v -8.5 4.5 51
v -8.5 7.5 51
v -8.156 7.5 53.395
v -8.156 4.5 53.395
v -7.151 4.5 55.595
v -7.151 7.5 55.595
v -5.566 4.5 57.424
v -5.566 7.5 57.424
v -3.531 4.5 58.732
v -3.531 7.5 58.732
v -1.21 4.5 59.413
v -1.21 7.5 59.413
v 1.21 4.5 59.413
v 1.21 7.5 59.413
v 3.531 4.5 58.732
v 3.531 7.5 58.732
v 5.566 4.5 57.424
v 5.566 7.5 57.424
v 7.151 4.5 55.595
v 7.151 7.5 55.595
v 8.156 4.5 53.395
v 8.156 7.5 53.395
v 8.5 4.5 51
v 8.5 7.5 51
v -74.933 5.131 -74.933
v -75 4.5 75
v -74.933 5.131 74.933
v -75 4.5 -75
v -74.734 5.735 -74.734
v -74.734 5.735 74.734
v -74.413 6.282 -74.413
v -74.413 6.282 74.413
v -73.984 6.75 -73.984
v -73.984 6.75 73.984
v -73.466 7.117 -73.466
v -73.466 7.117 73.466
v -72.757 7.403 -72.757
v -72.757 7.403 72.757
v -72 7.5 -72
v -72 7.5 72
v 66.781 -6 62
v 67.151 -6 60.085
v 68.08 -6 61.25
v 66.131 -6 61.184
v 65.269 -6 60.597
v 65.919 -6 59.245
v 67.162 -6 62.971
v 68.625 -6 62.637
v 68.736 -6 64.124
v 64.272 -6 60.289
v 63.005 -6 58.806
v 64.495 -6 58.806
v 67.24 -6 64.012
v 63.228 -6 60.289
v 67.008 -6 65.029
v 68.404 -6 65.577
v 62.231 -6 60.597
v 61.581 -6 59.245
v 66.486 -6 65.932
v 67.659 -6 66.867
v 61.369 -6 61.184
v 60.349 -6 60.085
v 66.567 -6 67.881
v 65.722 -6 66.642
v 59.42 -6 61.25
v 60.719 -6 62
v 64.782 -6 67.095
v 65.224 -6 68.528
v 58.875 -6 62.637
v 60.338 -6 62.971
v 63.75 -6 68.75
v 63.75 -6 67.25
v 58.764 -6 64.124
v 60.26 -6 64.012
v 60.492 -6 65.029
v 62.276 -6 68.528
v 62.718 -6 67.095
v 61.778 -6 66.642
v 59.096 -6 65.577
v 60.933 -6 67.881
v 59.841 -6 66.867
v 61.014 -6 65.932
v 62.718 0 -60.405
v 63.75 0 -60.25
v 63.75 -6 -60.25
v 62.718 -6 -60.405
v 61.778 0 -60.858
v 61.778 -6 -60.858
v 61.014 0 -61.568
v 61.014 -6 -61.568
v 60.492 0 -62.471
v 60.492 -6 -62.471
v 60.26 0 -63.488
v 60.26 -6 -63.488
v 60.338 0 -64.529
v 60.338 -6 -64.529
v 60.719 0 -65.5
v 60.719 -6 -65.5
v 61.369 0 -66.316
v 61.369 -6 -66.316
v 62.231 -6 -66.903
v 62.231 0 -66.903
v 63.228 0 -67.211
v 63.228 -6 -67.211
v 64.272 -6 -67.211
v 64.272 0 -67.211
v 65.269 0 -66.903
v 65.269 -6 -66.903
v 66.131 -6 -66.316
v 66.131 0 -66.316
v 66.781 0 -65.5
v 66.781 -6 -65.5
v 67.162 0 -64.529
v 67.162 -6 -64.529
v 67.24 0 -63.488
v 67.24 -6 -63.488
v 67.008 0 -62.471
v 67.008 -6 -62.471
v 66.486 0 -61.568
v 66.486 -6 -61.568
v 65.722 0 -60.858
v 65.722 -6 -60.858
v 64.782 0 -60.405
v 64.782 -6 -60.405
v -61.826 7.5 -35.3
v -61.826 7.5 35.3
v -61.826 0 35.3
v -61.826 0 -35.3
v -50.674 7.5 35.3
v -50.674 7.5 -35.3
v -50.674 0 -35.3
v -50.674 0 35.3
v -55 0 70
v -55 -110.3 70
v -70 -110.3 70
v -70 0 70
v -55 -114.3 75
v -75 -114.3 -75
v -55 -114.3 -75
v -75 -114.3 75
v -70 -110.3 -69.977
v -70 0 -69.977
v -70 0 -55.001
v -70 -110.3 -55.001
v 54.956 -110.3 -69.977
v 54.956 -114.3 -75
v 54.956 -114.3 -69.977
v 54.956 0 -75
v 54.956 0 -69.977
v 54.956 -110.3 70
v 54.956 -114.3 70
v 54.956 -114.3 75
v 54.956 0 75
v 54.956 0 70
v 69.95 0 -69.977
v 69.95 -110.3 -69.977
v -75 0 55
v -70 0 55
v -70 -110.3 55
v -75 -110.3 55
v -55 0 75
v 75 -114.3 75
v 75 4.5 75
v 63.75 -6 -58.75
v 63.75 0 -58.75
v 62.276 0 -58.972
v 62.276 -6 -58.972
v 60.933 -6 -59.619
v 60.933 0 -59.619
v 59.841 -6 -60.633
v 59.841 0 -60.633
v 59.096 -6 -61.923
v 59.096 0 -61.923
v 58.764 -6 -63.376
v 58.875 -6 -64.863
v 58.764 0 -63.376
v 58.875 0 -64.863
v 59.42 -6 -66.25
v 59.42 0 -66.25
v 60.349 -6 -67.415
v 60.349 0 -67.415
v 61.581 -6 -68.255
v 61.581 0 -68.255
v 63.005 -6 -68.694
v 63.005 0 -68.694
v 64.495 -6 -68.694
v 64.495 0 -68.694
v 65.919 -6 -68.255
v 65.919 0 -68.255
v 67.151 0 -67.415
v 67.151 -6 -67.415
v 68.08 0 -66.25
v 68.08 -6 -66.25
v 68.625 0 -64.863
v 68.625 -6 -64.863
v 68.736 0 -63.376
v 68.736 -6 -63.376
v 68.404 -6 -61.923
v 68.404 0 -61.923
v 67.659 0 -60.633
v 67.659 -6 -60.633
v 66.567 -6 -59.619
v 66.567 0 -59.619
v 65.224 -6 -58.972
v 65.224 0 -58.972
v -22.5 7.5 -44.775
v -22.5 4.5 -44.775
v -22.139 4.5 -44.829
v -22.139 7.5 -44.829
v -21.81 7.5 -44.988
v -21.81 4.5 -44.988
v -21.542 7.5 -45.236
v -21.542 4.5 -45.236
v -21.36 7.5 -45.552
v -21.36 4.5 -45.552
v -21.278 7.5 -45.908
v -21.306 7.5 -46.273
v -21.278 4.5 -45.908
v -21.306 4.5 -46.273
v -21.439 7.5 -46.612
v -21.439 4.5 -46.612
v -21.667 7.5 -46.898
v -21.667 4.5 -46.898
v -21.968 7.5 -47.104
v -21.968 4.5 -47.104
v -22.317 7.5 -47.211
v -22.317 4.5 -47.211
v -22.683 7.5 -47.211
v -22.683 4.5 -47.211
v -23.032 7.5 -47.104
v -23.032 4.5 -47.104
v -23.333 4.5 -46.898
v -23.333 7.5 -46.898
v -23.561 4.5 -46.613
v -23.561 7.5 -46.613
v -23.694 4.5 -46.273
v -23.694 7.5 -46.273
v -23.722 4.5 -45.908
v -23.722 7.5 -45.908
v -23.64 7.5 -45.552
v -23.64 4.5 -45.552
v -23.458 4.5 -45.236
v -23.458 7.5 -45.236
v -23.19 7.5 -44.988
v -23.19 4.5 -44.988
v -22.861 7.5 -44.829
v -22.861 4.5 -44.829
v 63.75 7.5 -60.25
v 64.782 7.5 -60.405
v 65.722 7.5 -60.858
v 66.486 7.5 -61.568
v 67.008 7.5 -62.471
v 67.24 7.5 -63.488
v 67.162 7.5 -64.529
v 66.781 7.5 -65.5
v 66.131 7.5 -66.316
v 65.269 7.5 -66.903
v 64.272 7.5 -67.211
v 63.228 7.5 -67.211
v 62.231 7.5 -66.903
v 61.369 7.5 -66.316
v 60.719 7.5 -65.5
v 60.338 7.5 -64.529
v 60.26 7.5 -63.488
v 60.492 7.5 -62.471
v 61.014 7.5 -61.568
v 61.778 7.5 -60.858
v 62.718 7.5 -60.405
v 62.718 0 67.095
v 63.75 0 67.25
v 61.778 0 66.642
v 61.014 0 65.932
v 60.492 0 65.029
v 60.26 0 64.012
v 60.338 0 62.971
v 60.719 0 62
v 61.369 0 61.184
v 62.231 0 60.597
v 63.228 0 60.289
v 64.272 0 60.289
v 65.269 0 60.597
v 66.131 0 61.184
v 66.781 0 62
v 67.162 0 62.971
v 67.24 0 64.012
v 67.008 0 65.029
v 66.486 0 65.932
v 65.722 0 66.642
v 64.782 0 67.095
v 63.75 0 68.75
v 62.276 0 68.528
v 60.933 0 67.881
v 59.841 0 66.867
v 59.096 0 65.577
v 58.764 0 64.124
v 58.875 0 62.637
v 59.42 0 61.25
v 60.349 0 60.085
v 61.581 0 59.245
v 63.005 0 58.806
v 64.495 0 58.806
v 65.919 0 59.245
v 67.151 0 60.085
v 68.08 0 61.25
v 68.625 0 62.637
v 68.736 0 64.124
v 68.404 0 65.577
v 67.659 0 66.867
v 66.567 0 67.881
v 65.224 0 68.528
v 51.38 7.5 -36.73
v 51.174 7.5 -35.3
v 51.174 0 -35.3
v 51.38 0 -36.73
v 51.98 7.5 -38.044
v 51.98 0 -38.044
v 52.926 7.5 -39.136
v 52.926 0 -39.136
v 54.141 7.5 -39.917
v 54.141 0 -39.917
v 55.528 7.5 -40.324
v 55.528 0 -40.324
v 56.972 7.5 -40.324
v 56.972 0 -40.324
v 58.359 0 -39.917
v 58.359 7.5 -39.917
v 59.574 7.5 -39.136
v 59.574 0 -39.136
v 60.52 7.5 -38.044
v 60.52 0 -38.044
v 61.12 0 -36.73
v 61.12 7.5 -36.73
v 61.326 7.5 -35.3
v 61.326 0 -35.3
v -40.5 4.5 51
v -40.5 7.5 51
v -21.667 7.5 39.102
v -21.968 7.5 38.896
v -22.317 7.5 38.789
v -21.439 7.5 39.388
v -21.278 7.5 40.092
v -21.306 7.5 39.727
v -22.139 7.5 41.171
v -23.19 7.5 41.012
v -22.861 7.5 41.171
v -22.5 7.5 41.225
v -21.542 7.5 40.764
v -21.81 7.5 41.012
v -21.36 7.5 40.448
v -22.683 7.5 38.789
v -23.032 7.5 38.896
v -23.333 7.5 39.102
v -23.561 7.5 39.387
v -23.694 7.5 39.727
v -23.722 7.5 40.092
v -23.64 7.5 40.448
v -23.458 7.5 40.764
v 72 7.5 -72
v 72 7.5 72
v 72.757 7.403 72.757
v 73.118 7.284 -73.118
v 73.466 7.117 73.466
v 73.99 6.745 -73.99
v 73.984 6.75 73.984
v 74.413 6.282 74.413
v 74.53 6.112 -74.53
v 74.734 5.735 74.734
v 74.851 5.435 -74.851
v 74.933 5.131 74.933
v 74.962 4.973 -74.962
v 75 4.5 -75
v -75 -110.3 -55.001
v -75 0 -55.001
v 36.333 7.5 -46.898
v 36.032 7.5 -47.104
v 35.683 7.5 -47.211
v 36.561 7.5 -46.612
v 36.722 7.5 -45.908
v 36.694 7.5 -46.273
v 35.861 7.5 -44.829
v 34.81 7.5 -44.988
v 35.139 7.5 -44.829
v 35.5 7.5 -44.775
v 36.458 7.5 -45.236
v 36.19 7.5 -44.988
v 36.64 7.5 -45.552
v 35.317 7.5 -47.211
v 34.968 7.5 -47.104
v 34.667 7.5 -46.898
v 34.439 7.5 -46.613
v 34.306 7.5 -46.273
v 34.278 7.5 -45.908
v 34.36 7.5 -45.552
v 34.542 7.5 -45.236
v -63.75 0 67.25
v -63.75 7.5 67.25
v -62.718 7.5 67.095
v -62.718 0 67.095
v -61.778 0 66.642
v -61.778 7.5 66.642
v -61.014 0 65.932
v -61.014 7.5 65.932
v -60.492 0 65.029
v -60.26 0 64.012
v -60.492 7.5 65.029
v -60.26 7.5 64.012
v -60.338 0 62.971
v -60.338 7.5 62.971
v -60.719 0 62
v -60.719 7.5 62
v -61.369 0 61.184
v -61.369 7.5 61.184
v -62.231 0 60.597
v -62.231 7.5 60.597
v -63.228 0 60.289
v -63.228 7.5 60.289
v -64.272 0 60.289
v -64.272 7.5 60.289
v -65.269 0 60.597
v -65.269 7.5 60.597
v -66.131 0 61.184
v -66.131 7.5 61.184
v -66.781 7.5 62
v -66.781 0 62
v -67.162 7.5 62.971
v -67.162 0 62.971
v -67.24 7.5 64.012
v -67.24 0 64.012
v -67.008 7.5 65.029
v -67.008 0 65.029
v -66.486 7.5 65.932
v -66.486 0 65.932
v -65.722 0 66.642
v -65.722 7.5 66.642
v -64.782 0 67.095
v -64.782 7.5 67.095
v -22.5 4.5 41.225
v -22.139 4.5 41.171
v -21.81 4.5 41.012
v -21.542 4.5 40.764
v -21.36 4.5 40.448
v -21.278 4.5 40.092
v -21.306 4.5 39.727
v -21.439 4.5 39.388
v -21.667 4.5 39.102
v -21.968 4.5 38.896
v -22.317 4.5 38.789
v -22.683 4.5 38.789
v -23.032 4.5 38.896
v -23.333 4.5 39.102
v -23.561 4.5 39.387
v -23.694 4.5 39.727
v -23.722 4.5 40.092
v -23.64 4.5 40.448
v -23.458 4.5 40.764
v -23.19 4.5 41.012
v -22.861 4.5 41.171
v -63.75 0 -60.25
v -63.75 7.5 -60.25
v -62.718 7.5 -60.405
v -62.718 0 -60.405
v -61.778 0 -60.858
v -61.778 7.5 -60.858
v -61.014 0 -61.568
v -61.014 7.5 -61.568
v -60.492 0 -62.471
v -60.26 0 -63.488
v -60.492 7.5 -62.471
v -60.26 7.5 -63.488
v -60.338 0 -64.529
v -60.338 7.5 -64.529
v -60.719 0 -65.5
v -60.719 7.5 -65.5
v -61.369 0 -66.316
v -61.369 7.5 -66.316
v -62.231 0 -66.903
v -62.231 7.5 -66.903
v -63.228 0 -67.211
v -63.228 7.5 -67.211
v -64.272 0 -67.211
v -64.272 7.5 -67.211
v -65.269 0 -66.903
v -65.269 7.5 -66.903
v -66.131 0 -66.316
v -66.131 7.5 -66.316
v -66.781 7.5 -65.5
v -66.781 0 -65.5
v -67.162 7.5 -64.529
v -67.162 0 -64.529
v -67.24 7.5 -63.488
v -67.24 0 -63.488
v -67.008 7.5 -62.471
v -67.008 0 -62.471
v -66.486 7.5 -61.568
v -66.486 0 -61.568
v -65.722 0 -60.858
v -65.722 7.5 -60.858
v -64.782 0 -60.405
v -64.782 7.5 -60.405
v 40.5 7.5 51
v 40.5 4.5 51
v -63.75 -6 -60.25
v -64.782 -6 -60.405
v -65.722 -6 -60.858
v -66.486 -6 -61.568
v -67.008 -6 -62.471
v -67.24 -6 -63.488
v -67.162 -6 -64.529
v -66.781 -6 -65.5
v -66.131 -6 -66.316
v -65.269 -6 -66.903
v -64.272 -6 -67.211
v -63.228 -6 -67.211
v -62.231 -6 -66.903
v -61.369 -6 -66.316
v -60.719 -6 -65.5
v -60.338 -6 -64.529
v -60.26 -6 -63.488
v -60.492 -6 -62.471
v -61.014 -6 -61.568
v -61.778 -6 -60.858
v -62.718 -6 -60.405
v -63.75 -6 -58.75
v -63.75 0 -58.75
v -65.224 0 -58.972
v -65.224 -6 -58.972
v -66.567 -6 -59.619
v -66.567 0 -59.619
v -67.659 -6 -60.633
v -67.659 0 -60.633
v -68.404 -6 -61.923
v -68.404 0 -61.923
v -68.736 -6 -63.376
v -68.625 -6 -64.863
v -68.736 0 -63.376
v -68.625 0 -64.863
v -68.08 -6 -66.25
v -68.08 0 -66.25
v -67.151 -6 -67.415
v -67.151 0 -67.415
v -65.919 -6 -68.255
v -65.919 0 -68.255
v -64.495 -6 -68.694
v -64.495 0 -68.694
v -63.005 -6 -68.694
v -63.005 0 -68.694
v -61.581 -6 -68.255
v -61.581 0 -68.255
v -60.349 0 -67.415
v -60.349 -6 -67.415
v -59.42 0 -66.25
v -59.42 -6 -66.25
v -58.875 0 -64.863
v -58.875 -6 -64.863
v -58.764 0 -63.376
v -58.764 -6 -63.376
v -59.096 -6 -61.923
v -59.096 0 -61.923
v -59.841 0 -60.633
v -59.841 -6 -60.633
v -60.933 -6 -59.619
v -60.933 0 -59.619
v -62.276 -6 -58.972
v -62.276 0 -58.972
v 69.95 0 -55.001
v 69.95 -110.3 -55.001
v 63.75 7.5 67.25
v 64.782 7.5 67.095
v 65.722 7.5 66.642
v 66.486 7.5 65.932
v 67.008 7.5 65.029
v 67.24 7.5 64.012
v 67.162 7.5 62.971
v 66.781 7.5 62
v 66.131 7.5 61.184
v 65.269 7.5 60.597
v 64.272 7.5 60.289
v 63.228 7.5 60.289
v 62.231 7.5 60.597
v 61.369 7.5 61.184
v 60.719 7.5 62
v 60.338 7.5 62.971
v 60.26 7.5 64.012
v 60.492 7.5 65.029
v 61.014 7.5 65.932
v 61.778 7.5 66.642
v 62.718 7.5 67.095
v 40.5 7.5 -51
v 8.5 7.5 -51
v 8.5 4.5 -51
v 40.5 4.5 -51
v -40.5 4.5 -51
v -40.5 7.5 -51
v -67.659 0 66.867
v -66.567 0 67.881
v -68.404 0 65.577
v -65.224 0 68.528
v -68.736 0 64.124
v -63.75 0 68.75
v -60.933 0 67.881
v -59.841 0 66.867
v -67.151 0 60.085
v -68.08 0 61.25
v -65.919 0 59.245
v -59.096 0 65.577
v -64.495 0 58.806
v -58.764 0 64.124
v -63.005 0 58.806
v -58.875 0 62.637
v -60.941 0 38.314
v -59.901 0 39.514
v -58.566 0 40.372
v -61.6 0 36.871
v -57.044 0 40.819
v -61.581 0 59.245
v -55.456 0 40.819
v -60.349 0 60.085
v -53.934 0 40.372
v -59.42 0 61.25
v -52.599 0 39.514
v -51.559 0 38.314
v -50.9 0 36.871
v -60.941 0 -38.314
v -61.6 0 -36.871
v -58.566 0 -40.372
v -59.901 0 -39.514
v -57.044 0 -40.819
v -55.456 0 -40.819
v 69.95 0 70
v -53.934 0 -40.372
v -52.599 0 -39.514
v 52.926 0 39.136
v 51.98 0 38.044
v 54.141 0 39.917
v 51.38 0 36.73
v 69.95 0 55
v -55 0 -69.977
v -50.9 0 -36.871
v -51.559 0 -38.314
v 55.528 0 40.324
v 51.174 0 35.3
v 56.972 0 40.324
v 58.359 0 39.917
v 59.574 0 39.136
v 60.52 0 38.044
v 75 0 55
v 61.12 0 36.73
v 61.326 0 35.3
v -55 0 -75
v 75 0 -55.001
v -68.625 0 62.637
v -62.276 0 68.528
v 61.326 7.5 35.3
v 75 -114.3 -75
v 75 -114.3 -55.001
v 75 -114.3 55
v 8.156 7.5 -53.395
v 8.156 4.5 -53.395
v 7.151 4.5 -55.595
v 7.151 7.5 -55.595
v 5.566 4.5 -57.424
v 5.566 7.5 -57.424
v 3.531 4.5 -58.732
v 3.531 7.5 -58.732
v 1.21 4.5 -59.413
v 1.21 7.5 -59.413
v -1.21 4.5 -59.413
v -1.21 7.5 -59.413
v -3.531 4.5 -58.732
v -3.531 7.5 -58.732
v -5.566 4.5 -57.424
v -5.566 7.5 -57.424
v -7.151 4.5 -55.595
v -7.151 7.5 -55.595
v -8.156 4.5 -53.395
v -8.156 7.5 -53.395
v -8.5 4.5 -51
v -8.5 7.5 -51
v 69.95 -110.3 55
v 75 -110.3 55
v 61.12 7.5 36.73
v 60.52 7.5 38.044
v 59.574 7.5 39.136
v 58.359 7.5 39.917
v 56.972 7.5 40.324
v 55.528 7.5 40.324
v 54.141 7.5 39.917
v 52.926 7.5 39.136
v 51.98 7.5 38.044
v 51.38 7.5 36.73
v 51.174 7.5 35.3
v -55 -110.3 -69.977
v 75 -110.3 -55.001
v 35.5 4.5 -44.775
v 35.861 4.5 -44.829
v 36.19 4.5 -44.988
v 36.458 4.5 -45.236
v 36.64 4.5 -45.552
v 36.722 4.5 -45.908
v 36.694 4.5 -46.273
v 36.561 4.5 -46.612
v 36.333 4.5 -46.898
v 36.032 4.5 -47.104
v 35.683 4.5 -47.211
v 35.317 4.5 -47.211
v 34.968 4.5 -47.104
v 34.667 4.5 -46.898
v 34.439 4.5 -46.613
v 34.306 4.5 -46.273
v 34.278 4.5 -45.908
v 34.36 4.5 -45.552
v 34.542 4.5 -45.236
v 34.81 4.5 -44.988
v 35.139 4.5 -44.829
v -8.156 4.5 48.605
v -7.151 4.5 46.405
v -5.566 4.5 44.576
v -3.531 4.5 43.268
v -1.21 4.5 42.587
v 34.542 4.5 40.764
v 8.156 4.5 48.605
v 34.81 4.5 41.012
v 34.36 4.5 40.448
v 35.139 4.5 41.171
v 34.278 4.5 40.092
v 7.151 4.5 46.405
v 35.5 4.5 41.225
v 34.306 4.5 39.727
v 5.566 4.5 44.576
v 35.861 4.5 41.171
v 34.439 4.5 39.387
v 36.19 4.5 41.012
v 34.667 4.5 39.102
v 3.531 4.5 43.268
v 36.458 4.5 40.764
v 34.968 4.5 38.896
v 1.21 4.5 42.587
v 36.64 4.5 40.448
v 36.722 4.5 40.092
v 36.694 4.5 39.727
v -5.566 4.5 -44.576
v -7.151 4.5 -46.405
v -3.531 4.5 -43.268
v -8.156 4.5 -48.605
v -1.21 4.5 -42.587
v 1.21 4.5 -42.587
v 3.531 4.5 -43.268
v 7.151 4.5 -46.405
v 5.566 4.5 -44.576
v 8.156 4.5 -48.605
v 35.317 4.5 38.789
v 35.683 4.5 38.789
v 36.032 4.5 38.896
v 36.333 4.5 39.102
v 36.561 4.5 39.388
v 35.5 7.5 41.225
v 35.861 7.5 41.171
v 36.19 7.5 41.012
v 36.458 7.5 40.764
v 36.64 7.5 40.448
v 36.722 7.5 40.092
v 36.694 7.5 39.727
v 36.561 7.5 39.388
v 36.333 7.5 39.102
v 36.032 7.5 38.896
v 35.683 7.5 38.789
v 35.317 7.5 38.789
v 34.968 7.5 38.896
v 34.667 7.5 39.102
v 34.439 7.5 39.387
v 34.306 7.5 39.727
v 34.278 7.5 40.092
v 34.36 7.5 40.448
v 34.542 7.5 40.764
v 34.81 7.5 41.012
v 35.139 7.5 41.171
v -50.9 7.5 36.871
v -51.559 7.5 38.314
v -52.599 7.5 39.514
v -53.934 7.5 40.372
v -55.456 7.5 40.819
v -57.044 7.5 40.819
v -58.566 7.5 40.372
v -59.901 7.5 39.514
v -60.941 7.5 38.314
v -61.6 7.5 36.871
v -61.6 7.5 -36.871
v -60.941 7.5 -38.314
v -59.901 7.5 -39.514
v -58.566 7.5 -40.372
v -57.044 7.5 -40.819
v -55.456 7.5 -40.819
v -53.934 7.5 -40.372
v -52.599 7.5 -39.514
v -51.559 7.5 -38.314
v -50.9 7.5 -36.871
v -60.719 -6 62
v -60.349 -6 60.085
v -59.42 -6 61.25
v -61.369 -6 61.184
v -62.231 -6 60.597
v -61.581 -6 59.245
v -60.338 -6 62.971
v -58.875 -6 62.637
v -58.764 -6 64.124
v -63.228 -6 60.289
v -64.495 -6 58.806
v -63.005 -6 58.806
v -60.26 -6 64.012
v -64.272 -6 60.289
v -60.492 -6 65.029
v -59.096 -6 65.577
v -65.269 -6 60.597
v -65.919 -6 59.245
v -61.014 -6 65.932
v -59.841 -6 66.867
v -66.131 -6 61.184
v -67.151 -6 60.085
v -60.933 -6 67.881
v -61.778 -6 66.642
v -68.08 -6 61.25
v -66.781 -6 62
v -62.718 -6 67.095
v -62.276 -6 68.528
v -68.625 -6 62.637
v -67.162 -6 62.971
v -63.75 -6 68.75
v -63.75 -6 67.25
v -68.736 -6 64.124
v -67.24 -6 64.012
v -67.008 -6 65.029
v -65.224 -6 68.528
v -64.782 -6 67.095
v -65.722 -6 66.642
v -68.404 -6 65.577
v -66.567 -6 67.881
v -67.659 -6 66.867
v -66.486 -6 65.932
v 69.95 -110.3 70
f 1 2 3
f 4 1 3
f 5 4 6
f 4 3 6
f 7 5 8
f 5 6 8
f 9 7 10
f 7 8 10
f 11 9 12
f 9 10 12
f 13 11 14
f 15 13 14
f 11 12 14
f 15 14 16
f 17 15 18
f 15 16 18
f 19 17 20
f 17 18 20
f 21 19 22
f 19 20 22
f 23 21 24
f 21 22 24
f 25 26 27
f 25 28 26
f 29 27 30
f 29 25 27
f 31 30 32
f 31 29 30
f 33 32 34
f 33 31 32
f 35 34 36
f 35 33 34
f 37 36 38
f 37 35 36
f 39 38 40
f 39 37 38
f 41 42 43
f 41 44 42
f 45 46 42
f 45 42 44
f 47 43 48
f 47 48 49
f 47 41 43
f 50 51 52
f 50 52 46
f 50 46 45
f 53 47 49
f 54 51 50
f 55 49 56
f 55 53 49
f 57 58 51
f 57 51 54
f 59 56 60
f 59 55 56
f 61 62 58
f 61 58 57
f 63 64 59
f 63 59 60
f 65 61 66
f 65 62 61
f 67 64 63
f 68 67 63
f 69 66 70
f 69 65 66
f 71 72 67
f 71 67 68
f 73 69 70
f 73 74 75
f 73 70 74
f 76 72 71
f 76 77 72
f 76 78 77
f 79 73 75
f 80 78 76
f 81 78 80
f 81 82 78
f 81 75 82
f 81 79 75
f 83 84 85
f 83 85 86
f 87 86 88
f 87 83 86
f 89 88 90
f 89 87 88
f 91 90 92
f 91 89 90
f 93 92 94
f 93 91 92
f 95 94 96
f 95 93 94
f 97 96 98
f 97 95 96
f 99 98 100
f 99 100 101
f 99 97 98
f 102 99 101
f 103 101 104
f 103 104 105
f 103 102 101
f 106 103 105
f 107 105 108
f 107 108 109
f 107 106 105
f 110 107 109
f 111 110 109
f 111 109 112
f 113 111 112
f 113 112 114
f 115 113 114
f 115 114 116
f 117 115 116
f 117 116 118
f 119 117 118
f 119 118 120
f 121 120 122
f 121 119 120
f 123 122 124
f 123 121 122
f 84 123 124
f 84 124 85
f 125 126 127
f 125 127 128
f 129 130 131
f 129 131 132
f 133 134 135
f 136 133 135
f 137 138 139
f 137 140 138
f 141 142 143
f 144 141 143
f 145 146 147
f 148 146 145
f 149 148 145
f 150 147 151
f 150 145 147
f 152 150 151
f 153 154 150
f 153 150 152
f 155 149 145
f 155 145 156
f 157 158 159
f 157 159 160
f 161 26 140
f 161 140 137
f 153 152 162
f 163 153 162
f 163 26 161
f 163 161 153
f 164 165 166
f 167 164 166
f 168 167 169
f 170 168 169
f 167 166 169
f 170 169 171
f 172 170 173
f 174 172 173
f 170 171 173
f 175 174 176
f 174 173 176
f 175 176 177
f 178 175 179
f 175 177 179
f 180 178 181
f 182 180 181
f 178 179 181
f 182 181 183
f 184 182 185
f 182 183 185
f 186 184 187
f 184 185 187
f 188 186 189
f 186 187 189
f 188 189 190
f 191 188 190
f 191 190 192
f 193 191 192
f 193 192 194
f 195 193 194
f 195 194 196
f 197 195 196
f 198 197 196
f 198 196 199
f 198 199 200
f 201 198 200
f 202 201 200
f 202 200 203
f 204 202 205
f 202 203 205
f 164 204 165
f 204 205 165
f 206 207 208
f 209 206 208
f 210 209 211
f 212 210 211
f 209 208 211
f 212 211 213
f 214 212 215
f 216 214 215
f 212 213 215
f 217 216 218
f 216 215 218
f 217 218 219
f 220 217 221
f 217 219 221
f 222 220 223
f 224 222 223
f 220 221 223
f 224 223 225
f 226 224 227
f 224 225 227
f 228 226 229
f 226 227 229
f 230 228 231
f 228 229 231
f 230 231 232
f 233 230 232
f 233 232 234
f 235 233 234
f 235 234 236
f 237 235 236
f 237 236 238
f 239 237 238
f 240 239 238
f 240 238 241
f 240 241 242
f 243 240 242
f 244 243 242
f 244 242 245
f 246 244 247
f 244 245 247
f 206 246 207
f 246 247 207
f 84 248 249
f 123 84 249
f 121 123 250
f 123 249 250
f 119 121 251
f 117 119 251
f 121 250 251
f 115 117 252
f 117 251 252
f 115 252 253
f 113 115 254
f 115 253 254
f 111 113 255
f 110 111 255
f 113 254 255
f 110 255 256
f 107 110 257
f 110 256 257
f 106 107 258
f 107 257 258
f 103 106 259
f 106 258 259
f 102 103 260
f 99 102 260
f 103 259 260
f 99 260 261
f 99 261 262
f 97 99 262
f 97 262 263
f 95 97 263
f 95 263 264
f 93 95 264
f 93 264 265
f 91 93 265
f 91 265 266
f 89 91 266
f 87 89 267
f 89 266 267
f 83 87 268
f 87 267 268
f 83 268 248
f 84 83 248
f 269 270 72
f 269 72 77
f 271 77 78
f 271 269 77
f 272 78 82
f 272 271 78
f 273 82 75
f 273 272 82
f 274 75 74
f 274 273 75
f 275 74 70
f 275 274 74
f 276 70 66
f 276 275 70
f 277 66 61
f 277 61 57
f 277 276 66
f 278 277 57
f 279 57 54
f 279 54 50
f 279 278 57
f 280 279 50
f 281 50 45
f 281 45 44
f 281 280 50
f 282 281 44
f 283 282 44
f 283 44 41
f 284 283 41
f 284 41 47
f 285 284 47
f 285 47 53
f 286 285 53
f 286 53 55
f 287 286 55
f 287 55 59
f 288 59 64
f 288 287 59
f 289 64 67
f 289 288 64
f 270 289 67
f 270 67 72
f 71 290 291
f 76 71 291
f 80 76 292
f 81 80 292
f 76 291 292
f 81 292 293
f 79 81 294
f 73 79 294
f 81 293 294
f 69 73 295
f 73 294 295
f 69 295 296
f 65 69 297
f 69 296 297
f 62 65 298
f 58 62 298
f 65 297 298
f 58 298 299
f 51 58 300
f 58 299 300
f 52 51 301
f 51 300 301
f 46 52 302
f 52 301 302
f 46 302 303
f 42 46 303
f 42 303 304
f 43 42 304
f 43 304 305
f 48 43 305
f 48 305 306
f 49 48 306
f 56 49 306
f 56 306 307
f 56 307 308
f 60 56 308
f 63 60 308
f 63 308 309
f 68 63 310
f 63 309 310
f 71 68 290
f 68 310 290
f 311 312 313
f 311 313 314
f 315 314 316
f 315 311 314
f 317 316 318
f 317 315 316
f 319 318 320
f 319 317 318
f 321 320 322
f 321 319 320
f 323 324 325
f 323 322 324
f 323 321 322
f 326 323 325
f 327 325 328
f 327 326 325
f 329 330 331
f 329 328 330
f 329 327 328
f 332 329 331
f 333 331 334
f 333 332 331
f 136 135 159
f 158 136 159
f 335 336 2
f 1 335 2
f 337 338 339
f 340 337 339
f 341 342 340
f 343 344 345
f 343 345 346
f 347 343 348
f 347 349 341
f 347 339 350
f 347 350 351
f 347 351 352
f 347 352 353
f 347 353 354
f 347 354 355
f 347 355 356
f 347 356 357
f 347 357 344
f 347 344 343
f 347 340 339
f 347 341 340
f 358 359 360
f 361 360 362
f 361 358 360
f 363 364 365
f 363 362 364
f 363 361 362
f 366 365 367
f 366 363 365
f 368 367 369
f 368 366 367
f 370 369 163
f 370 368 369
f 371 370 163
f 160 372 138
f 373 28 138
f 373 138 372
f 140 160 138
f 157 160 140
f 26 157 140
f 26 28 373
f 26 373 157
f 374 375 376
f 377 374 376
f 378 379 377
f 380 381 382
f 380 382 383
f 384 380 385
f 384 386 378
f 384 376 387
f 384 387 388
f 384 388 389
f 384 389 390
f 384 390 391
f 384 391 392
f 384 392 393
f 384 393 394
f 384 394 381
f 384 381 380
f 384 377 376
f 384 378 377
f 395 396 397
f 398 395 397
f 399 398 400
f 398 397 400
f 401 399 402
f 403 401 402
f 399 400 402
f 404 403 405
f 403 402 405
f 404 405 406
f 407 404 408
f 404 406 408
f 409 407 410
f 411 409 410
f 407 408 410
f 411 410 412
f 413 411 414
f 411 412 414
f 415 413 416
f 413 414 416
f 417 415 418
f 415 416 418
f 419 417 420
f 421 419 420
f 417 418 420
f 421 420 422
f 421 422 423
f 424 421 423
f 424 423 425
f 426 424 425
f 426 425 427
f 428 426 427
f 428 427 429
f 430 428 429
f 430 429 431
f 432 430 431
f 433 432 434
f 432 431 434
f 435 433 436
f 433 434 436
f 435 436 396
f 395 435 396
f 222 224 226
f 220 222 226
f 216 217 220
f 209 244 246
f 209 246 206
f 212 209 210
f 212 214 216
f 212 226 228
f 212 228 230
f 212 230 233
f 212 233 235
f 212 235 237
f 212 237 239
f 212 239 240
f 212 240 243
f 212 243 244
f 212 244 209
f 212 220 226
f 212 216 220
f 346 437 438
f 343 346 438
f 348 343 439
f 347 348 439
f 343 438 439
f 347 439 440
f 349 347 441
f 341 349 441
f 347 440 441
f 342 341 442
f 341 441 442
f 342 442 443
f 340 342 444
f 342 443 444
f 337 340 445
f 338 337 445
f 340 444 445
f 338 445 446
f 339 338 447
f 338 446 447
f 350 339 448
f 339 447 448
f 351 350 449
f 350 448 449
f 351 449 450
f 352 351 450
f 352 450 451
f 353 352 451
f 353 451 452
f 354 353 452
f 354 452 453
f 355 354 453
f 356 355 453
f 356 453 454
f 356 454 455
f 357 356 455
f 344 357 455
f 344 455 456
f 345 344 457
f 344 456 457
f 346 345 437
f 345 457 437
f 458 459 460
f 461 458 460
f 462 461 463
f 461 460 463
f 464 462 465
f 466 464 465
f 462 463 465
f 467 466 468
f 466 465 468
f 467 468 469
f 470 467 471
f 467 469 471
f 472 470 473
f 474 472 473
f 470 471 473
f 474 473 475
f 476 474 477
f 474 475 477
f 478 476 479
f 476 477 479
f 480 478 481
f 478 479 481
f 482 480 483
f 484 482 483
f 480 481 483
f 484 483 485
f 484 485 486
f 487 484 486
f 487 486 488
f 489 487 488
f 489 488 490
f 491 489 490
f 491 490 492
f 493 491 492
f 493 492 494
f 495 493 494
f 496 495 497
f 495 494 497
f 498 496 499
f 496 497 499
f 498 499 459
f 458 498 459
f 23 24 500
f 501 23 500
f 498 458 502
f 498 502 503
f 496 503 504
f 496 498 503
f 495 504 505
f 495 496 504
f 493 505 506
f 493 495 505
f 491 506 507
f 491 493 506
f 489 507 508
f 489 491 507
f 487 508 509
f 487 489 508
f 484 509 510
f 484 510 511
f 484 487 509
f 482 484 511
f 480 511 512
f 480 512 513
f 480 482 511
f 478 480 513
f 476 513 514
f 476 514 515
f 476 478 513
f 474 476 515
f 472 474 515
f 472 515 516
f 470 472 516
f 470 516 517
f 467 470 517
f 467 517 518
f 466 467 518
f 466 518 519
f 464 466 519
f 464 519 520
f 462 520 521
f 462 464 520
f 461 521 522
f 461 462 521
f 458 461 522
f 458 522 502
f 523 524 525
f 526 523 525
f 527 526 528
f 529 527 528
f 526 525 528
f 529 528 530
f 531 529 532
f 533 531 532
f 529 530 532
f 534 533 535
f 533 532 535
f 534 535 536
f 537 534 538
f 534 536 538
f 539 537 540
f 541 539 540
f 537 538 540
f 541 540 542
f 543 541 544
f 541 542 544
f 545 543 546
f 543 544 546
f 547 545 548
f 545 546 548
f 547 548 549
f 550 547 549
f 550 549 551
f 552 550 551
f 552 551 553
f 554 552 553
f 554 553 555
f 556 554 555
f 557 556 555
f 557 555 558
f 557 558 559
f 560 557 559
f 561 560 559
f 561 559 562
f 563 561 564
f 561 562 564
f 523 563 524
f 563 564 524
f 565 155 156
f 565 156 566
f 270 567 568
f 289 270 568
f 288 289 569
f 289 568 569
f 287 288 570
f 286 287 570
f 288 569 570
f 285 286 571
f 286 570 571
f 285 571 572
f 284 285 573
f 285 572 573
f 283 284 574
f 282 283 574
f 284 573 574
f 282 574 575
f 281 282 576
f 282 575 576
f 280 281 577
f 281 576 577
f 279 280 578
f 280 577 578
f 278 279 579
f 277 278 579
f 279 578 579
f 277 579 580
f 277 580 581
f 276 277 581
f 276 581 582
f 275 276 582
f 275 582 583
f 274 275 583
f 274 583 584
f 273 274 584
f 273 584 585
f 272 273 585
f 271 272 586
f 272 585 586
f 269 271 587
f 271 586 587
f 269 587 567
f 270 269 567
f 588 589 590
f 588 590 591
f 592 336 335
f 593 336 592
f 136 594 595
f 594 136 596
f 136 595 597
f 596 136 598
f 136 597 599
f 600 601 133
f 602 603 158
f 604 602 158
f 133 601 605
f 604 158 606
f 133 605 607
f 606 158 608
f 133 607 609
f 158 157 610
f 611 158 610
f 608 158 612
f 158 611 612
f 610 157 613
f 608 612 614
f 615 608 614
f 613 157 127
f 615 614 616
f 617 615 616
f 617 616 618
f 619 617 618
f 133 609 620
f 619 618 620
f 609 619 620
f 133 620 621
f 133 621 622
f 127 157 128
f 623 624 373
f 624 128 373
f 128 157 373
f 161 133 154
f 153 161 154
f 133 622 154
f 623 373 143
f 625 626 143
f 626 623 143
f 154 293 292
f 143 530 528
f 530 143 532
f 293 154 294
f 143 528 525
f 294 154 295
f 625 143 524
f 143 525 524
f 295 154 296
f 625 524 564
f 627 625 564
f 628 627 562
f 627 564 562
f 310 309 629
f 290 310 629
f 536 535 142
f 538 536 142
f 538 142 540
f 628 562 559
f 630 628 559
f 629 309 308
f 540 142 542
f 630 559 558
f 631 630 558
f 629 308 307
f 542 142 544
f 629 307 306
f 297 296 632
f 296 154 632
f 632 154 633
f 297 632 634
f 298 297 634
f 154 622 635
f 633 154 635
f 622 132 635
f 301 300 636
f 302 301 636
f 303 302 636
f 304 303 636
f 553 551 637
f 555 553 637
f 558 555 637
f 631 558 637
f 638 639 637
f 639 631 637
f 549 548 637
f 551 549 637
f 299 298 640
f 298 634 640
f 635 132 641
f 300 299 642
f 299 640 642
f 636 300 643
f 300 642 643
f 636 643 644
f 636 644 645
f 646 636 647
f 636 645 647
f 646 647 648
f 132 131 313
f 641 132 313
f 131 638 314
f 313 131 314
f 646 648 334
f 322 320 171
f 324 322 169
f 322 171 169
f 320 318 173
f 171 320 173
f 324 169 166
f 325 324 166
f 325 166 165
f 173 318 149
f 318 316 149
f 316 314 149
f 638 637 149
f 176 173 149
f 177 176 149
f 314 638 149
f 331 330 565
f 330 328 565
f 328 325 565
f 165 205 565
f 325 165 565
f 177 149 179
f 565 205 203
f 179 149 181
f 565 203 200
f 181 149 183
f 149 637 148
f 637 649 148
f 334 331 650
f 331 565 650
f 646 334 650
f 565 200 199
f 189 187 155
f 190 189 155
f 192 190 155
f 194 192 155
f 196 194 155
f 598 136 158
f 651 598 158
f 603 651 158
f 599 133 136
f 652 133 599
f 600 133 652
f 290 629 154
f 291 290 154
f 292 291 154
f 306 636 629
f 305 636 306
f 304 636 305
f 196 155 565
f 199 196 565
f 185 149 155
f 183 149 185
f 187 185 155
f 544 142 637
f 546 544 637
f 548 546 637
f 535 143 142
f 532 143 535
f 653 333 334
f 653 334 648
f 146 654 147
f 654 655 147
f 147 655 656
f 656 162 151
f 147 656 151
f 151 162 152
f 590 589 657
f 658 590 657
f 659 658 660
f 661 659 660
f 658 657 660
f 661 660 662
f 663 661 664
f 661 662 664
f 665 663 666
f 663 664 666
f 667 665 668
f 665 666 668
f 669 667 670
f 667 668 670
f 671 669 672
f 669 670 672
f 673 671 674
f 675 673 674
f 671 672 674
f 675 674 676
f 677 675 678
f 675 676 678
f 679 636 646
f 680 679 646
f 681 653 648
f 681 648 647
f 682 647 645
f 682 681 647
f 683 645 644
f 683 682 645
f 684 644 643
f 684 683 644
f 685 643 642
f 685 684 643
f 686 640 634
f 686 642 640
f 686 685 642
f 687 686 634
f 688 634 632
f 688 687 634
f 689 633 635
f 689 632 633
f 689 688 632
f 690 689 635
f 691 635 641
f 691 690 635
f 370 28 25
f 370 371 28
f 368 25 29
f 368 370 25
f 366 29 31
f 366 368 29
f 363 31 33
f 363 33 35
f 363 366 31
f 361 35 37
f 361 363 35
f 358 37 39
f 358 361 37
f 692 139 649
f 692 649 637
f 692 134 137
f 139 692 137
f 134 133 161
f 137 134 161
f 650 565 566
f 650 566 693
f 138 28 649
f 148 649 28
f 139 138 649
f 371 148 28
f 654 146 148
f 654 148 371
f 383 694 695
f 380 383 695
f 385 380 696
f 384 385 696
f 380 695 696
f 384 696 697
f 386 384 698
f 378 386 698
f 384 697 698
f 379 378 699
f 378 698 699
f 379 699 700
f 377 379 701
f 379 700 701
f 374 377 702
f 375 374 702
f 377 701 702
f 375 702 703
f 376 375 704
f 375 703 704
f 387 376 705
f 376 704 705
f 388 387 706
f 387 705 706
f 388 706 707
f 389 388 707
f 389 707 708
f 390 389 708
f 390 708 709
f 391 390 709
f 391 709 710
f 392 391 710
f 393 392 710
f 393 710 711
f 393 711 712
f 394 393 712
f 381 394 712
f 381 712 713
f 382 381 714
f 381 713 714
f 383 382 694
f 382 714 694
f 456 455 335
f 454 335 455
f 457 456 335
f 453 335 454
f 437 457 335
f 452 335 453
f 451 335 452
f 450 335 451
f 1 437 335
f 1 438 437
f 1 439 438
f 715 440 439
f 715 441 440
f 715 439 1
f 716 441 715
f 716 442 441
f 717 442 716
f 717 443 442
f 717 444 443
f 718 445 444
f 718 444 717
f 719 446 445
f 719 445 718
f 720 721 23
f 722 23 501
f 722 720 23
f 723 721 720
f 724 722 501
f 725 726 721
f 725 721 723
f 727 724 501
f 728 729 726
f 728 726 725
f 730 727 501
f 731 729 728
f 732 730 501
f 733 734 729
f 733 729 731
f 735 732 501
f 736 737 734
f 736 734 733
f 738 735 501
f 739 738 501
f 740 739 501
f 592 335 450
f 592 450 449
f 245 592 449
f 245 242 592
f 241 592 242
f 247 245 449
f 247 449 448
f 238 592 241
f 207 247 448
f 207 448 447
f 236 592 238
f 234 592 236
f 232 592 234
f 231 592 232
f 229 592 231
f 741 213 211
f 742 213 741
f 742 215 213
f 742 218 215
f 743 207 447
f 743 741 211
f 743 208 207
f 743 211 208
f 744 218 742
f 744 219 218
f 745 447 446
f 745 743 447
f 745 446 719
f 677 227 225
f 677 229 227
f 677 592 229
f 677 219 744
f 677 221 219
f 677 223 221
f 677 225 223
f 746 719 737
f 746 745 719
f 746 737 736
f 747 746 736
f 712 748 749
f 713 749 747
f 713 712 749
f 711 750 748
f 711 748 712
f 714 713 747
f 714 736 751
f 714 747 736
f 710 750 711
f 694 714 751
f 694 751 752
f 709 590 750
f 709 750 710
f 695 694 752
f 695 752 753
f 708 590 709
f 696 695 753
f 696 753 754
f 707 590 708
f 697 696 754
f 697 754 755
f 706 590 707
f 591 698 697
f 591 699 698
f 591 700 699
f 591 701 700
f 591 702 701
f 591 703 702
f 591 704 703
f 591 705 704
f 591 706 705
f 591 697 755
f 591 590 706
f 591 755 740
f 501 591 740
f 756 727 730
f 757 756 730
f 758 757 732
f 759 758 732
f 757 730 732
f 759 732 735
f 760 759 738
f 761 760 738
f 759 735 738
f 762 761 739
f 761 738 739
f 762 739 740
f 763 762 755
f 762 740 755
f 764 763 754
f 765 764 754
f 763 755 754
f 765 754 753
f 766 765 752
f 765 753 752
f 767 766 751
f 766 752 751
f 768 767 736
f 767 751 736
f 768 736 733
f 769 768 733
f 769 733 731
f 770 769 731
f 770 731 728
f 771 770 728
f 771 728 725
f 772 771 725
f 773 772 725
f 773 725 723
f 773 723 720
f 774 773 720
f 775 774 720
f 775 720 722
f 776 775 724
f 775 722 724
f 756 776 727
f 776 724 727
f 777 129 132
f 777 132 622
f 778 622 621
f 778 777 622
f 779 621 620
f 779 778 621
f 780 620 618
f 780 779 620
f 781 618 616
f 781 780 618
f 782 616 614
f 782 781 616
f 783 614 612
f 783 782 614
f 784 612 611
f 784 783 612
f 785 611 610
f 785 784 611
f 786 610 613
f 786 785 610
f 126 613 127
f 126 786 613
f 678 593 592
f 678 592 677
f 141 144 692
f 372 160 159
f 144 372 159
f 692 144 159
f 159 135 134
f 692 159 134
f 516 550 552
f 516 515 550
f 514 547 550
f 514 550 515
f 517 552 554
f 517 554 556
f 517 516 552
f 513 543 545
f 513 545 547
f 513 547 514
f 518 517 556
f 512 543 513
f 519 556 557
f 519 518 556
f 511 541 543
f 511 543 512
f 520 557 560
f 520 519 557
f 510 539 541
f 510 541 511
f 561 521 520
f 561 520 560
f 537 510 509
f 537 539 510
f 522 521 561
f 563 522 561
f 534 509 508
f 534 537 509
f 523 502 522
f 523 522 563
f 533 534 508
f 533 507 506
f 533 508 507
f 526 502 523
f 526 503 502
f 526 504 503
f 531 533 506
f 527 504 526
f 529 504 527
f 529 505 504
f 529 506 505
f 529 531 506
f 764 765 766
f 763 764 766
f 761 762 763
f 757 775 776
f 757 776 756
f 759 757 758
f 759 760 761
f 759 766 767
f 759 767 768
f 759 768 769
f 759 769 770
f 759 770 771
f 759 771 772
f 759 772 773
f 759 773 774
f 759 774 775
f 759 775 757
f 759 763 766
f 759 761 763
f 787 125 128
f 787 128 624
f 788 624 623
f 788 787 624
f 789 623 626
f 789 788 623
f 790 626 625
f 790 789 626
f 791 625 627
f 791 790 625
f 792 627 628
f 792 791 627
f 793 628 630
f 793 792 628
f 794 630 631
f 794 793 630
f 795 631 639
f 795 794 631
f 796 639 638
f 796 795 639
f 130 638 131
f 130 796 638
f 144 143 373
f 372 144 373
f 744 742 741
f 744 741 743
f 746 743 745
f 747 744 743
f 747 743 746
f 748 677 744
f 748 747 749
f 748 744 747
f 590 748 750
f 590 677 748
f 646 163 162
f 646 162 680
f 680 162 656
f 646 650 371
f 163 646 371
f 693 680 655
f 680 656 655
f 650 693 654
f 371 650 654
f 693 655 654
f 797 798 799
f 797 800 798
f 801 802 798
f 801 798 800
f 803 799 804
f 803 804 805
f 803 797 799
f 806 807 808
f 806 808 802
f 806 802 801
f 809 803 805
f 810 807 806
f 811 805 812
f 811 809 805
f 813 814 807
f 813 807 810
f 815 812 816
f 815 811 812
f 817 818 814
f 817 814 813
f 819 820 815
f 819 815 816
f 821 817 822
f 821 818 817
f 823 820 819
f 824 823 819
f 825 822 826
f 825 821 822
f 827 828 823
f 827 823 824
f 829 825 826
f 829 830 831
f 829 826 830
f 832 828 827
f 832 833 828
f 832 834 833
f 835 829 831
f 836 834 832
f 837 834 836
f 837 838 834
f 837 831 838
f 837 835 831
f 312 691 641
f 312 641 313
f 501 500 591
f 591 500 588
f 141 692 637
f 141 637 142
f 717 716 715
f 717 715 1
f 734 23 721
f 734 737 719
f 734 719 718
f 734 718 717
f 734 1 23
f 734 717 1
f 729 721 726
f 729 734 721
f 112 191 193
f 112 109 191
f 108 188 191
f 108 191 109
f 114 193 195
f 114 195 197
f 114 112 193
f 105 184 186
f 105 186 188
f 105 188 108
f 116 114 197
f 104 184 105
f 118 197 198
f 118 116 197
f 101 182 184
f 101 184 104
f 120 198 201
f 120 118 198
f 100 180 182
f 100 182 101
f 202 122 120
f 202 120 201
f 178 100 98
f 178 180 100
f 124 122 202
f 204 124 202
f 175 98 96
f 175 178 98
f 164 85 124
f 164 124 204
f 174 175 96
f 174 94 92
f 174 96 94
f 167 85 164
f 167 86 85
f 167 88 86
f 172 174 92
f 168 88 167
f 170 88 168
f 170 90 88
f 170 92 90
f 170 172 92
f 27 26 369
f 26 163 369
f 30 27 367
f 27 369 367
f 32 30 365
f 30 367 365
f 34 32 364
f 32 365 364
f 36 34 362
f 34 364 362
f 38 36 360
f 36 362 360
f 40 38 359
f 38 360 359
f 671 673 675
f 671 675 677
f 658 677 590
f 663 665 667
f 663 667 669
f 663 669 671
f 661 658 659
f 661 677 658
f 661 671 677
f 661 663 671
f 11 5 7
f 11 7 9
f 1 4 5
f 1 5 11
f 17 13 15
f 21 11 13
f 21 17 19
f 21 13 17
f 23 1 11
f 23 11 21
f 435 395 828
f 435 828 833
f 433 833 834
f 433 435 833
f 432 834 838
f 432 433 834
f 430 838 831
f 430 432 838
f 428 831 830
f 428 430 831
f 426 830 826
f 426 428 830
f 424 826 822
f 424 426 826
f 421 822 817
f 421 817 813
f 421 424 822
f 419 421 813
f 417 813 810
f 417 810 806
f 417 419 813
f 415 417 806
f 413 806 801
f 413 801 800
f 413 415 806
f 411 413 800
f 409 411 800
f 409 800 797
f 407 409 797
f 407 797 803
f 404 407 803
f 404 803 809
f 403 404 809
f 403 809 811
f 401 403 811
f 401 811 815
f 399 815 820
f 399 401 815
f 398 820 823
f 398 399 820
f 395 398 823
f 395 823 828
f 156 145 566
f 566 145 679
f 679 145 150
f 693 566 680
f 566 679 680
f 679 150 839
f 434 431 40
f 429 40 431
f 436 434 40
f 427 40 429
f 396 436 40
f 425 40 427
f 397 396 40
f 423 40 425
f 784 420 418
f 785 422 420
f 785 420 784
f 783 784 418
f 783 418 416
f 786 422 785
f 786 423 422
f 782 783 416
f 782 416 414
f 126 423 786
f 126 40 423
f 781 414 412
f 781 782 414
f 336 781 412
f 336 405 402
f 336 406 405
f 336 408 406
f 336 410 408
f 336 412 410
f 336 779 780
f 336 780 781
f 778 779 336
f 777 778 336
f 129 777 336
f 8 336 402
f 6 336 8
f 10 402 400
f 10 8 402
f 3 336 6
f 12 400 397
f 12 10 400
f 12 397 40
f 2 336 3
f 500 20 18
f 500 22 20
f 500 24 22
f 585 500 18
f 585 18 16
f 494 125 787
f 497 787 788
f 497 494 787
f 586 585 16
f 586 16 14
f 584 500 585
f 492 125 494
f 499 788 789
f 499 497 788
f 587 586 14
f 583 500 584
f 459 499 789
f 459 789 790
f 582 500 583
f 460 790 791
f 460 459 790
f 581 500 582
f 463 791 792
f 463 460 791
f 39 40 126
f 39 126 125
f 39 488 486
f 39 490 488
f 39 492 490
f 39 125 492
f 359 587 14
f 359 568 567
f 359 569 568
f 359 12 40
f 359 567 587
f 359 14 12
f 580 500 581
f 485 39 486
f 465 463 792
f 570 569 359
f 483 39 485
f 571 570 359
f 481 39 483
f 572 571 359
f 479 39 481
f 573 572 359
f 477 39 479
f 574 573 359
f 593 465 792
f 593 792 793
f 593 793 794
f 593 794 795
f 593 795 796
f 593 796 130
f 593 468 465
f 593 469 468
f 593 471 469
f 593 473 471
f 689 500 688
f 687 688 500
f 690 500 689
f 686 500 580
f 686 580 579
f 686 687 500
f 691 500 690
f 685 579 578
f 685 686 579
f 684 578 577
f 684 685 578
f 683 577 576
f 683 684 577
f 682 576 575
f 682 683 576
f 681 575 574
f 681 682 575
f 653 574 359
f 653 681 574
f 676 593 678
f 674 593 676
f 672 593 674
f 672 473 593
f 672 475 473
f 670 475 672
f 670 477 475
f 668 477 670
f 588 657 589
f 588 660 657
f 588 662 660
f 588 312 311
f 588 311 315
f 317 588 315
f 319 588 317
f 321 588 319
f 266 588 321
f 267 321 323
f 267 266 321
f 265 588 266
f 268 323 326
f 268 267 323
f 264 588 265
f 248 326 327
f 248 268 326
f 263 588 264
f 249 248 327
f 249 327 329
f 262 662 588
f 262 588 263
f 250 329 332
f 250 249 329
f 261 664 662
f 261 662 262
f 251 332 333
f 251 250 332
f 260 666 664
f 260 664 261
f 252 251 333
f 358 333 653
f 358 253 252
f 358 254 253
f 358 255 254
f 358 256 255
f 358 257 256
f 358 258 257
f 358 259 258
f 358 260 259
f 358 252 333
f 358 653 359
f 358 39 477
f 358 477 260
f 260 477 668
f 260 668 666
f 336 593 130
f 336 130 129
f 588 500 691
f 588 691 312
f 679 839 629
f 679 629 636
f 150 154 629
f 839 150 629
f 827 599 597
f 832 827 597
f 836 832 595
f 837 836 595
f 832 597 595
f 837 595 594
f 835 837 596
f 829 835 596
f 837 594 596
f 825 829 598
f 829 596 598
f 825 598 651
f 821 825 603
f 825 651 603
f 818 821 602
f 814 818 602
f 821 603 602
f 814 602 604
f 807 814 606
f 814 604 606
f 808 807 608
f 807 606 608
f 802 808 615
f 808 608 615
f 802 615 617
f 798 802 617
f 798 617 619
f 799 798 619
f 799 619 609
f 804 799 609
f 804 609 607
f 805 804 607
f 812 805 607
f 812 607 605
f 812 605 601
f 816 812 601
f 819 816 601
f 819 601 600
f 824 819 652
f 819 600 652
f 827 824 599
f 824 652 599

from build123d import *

# Parameters (mm, degrees)
SKETCH1_W           = 150
SKETCH1_H           = 150
BOSS_EXTRUDE1_DEPTH = 7.5
BOSS_EXTRUDE2_DEPTH = 114.3
FILLET1_R           = 3
SKETCH3_W           = 20.043778543
SKETCH3_H           = 150
SKETCH3_W_2         = 20
BOSS_EXTRUDE3_DEPTH = 4
SKETCH5_W           = 81
SKETCH5_H           = 102
CUT_EXTRUDE1_DEPTH  = 3
CUT_EXTRUDE3_REACH  = 163.509
SKETCH7_R           = 1.225
BOSS_EXTRUDE4_DEPTH = 3
SKETCH8_R           = 3.5
CUT_EXTRUDE4_DEPTH  = 7.5
SKETCH9_R           = 5
SKETCH9_R_2         = 3.5
BOSS_EXTRUDE5_DEPTH = 6
SKETCH10_R          = 8.5
CUT_EXTRUDE5_DEPTH  = 3


with BuildPart() as part:
    # Sketch1 → Boss-Extrude1 (new body)
    with BuildSketch(Plane(origin=(0, 0, 0), x_dir=(1, 0, 0), z_dir=(0, 1, 0))):
        Rectangle(SKETCH1_W, SKETCH1_H)
    extrude(amount=BOSS_EXTRUDE1_DEPTH)

    # Sketch2 → Boss-Extrude2 (add)
    with BuildSketch(Plane.XZ):
        Polygon((-75, 75), (-55, 75), (-55, 70), (-70, 70), (-70, 55), (-75, 55), align=None)
        Polygon((75, 75), (54.956221457, 75), (54.956221457, 70), (69.950175757, 70), (69.950175757, 55), (75, 55), align=None)
        Polygon((-75, -75), (-55, -75), (-55, -69.976562657), (-70, -69.976562657), (-70, -55.000720359), (-75, -55.000720359), align=None)
        Polygon((75, -75), (54.956221457, -75), (54.956221457, -69.976562657), (69.950175757, -69.976562657), (69.950175757, -55.000720359), (75, -55.000720359), align=None)
    extrude(amount=BOSS_EXTRUDE2_DEPTH)

    # Fillet1
    fillet1_edges = [part.edges().sort_by_distance(p)[0] for p in [
        (-75, 7.5, 0),
        (0, 7.5, 75),
        (75, 7.5, 0),
        (0, 7.5, -75),
    ]]
    fillet(fillet1_edges, radius=FILLET1_R)

    # Sketch3 → Boss-Extrude3 (add)
    with BuildSketch(Plane.XZ.offset(114.3)):
        with Locations((64.978110728, 0)):
            Rectangle(SKETCH3_W, SKETCH3_H)
        with Locations((-65, 0)):
            Rectangle(SKETCH3_W_2, SKETCH3_H)
    extrude(amount=-BOSS_EXTRUDE3_DEPTH)

    # Sketch5 → Cut-Extrude1 (cut)
    with BuildSketch(Plane(origin=(0, 7.5, 0), x_dir=(1, 0, 0), z_dir=(0, 1, 0))):
        Rectangle(SKETCH5_W, SKETCH5_H)
    extrude(amount=-CUT_EXTRUDE1_DEPTH, mode=Mode.SUBTRACT)

    # Sketch6 → Cut-Extrude3 (cut, up to next)
    with BuildSketch(Plane(origin=(0, 7.5, 0), x_dir=(1, 0, 0), z_dir=(0, 1, 0)), mode=Mode.PRIVATE) as cut_extrude3_sk1:
        with BuildLine():
            Line((-50.674102898, 35.299678475), (-50.674102898, -35.299678475))
            ThreePointArc((-50.674102898, -35.299678475), (-56.25, -40.875575577), (-61.825897102, -35.299678475))
            Line((-61.825897102, -35.299678475), (-61.825897102, 35.299678475))
            ThreePointArc((-61.825897102, 35.299678475), (-56.25, 40.875575577), (-50.674102898, 35.299678475))
        make_face()
    cut_extrude3_tool1 = extrude(cut_extrude3_sk1.sketch, amount=-CUT_EXTRUDE3_REACH, mode=Mode.PRIVATE) & part.part
    # Sketch6 → Cut-Extrude3 (cut, up to next)
    with BuildSketch(Plane(origin=(0, 7.5, 0), x_dir=(1, 0, 0), z_dir=(0, 1, 0)), mode=Mode.PRIVATE) as cut_extrude3_sk2:
        with BuildLine():
            Line((61.3258971, 35.299678475), (61.3258971, -35.299678475))
            ThreePointArc((61.3258971, -35.299678475), (56.25, -40.375575575), (51.1741029, -35.299678475))
            Line((51.1741029, -35.299678475), (51.1741029, 35.299678475))
            ThreePointArc((51.1741029, 35.299678475), (56.25, 40.375575575), (61.3258971, 35.299678475))
        make_face()
    cut_extrude3_tool2 = extrude(cut_extrude3_sk2.sketch, amount=-CUT_EXTRUDE3_REACH, mode=Mode.PRIVATE) & part.part
    add(cut_extrude3_tool1.solids().sort_by_distance((-56.25, 7.5, 0))[0], mode=Mode.SUBTRACT)
    add(cut_extrude3_tool2.solids().sort_by_distance((56.25, 7.5, 0))[0], mode=Mode.SUBTRACT)

    # Sketch7 → Boss-Extrude4 (add)
    with BuildSketch(Plane(origin=(0, 4.5, 0), x_dir=(1, 0, 0), z_dir=(0, 1, 0))):
        with Locations(Location((35.5, 46, 0), (0, 0, 270))):
            Circle(SKETCH7_R)
        with Locations(Location((-22.5, 46, 0), (0, 0, 270))):
            Circle(SKETCH7_R)
        with Locations(Location((-22.5, -40, 0), (0, 0, 270))):
            Circle(SKETCH7_R)
        with Locations(Location((35.5, -40, 0), (0, 0, 270))):
            Circle(SKETCH7_R)
    extrude(amount=BOSS_EXTRUDE4_DEPTH)

    # Sketch8 → Cut-Extrude4 (cut)
    with BuildSketch(Plane(origin=(0, 7.5, 0), x_dir=(1, 0, 0), z_dir=(0, 1, 0))):
        with Locations(Location((-63.75, -63.75, 0), (0, 0, 270))):
            Circle(SKETCH8_R)
        with Locations(Location((63.75, -63.75, 0), (0, 0, 270))):
            Circle(SKETCH8_R)
        with Locations(Location((-63.75, 63.75, 0), (0, 0, 270))):
            Circle(SKETCH8_R)
        with Locations(Location((63.75, 63.75, 0), (0, 0, 270))):
            Circle(SKETCH8_R)
    extrude(amount=-CUT_EXTRUDE4_DEPTH, mode=Mode.SUBTRACT)

    # Sketch9 → Boss-Extrude5 (add)
    # profile 1 of 4: a face of its own
    with BuildSketch(Plane.XZ):
        with Locations(Location((-63.75, 63.75, 0), (0, 0, 90))):
            Circle(SKETCH9_R)
        with Locations(Location((-63.75, 63.75, 0), (0, 0, 90))):
            Circle(SKETCH9_R_2, mode=Mode.SUBTRACT)
    # profile 2 of 4: a face of its own
    with BuildSketch(Plane.XZ):
        with Locations(Location((63.75, 63.75, 0), (0, 0, 90))):
            Circle(SKETCH9_R)
        with Locations(Location((63.75, 63.75, 0), (0, 0, 90))):
            Circle(SKETCH9_R_2, mode=Mode.SUBTRACT)
    # profile 3 of 4: a face of its own
    with BuildSketch(Plane.XZ):
        with Locations(Location((63.75, -63.75, 0), (0, 0, 90))):
            Circle(SKETCH9_R)
        with Locations(Location((63.75, -63.75, 0), (0, 0, 90))):
            Circle(SKETCH9_R_2, mode=Mode.SUBTRACT)
    # profile 4 of 4: a face of its own
    with BuildSketch(Plane.XZ):
        with Locations(Location((-63.75, -63.75, 0), (0, 0, 90))):
            Circle(SKETCH9_R)
        with Locations(Location((-63.75, -63.75, 0), (0, 0, 90))):
            Circle(SKETCH9_R_2, mode=Mode.SUBTRACT)
    extrude(amount=BOSS_EXTRUDE5_DEPTH)

    # Sketch10 → Cut-Extrude5 (cut)
    with BuildSketch(Plane(origin=(0, 7.5, 0), x_dir=(1, 0, 0), z_dir=(0, 1, 0))):
        with Locations((0, 51)):
            Circle(SKETCH10_R)
        with Locations((0, -51)):
            Circle(SKETCH10_R)
    extrude(amount=-CUT_EXTRUDE5_DEPTH, mode=Mode.SUBTRACT)


solid = part.part
